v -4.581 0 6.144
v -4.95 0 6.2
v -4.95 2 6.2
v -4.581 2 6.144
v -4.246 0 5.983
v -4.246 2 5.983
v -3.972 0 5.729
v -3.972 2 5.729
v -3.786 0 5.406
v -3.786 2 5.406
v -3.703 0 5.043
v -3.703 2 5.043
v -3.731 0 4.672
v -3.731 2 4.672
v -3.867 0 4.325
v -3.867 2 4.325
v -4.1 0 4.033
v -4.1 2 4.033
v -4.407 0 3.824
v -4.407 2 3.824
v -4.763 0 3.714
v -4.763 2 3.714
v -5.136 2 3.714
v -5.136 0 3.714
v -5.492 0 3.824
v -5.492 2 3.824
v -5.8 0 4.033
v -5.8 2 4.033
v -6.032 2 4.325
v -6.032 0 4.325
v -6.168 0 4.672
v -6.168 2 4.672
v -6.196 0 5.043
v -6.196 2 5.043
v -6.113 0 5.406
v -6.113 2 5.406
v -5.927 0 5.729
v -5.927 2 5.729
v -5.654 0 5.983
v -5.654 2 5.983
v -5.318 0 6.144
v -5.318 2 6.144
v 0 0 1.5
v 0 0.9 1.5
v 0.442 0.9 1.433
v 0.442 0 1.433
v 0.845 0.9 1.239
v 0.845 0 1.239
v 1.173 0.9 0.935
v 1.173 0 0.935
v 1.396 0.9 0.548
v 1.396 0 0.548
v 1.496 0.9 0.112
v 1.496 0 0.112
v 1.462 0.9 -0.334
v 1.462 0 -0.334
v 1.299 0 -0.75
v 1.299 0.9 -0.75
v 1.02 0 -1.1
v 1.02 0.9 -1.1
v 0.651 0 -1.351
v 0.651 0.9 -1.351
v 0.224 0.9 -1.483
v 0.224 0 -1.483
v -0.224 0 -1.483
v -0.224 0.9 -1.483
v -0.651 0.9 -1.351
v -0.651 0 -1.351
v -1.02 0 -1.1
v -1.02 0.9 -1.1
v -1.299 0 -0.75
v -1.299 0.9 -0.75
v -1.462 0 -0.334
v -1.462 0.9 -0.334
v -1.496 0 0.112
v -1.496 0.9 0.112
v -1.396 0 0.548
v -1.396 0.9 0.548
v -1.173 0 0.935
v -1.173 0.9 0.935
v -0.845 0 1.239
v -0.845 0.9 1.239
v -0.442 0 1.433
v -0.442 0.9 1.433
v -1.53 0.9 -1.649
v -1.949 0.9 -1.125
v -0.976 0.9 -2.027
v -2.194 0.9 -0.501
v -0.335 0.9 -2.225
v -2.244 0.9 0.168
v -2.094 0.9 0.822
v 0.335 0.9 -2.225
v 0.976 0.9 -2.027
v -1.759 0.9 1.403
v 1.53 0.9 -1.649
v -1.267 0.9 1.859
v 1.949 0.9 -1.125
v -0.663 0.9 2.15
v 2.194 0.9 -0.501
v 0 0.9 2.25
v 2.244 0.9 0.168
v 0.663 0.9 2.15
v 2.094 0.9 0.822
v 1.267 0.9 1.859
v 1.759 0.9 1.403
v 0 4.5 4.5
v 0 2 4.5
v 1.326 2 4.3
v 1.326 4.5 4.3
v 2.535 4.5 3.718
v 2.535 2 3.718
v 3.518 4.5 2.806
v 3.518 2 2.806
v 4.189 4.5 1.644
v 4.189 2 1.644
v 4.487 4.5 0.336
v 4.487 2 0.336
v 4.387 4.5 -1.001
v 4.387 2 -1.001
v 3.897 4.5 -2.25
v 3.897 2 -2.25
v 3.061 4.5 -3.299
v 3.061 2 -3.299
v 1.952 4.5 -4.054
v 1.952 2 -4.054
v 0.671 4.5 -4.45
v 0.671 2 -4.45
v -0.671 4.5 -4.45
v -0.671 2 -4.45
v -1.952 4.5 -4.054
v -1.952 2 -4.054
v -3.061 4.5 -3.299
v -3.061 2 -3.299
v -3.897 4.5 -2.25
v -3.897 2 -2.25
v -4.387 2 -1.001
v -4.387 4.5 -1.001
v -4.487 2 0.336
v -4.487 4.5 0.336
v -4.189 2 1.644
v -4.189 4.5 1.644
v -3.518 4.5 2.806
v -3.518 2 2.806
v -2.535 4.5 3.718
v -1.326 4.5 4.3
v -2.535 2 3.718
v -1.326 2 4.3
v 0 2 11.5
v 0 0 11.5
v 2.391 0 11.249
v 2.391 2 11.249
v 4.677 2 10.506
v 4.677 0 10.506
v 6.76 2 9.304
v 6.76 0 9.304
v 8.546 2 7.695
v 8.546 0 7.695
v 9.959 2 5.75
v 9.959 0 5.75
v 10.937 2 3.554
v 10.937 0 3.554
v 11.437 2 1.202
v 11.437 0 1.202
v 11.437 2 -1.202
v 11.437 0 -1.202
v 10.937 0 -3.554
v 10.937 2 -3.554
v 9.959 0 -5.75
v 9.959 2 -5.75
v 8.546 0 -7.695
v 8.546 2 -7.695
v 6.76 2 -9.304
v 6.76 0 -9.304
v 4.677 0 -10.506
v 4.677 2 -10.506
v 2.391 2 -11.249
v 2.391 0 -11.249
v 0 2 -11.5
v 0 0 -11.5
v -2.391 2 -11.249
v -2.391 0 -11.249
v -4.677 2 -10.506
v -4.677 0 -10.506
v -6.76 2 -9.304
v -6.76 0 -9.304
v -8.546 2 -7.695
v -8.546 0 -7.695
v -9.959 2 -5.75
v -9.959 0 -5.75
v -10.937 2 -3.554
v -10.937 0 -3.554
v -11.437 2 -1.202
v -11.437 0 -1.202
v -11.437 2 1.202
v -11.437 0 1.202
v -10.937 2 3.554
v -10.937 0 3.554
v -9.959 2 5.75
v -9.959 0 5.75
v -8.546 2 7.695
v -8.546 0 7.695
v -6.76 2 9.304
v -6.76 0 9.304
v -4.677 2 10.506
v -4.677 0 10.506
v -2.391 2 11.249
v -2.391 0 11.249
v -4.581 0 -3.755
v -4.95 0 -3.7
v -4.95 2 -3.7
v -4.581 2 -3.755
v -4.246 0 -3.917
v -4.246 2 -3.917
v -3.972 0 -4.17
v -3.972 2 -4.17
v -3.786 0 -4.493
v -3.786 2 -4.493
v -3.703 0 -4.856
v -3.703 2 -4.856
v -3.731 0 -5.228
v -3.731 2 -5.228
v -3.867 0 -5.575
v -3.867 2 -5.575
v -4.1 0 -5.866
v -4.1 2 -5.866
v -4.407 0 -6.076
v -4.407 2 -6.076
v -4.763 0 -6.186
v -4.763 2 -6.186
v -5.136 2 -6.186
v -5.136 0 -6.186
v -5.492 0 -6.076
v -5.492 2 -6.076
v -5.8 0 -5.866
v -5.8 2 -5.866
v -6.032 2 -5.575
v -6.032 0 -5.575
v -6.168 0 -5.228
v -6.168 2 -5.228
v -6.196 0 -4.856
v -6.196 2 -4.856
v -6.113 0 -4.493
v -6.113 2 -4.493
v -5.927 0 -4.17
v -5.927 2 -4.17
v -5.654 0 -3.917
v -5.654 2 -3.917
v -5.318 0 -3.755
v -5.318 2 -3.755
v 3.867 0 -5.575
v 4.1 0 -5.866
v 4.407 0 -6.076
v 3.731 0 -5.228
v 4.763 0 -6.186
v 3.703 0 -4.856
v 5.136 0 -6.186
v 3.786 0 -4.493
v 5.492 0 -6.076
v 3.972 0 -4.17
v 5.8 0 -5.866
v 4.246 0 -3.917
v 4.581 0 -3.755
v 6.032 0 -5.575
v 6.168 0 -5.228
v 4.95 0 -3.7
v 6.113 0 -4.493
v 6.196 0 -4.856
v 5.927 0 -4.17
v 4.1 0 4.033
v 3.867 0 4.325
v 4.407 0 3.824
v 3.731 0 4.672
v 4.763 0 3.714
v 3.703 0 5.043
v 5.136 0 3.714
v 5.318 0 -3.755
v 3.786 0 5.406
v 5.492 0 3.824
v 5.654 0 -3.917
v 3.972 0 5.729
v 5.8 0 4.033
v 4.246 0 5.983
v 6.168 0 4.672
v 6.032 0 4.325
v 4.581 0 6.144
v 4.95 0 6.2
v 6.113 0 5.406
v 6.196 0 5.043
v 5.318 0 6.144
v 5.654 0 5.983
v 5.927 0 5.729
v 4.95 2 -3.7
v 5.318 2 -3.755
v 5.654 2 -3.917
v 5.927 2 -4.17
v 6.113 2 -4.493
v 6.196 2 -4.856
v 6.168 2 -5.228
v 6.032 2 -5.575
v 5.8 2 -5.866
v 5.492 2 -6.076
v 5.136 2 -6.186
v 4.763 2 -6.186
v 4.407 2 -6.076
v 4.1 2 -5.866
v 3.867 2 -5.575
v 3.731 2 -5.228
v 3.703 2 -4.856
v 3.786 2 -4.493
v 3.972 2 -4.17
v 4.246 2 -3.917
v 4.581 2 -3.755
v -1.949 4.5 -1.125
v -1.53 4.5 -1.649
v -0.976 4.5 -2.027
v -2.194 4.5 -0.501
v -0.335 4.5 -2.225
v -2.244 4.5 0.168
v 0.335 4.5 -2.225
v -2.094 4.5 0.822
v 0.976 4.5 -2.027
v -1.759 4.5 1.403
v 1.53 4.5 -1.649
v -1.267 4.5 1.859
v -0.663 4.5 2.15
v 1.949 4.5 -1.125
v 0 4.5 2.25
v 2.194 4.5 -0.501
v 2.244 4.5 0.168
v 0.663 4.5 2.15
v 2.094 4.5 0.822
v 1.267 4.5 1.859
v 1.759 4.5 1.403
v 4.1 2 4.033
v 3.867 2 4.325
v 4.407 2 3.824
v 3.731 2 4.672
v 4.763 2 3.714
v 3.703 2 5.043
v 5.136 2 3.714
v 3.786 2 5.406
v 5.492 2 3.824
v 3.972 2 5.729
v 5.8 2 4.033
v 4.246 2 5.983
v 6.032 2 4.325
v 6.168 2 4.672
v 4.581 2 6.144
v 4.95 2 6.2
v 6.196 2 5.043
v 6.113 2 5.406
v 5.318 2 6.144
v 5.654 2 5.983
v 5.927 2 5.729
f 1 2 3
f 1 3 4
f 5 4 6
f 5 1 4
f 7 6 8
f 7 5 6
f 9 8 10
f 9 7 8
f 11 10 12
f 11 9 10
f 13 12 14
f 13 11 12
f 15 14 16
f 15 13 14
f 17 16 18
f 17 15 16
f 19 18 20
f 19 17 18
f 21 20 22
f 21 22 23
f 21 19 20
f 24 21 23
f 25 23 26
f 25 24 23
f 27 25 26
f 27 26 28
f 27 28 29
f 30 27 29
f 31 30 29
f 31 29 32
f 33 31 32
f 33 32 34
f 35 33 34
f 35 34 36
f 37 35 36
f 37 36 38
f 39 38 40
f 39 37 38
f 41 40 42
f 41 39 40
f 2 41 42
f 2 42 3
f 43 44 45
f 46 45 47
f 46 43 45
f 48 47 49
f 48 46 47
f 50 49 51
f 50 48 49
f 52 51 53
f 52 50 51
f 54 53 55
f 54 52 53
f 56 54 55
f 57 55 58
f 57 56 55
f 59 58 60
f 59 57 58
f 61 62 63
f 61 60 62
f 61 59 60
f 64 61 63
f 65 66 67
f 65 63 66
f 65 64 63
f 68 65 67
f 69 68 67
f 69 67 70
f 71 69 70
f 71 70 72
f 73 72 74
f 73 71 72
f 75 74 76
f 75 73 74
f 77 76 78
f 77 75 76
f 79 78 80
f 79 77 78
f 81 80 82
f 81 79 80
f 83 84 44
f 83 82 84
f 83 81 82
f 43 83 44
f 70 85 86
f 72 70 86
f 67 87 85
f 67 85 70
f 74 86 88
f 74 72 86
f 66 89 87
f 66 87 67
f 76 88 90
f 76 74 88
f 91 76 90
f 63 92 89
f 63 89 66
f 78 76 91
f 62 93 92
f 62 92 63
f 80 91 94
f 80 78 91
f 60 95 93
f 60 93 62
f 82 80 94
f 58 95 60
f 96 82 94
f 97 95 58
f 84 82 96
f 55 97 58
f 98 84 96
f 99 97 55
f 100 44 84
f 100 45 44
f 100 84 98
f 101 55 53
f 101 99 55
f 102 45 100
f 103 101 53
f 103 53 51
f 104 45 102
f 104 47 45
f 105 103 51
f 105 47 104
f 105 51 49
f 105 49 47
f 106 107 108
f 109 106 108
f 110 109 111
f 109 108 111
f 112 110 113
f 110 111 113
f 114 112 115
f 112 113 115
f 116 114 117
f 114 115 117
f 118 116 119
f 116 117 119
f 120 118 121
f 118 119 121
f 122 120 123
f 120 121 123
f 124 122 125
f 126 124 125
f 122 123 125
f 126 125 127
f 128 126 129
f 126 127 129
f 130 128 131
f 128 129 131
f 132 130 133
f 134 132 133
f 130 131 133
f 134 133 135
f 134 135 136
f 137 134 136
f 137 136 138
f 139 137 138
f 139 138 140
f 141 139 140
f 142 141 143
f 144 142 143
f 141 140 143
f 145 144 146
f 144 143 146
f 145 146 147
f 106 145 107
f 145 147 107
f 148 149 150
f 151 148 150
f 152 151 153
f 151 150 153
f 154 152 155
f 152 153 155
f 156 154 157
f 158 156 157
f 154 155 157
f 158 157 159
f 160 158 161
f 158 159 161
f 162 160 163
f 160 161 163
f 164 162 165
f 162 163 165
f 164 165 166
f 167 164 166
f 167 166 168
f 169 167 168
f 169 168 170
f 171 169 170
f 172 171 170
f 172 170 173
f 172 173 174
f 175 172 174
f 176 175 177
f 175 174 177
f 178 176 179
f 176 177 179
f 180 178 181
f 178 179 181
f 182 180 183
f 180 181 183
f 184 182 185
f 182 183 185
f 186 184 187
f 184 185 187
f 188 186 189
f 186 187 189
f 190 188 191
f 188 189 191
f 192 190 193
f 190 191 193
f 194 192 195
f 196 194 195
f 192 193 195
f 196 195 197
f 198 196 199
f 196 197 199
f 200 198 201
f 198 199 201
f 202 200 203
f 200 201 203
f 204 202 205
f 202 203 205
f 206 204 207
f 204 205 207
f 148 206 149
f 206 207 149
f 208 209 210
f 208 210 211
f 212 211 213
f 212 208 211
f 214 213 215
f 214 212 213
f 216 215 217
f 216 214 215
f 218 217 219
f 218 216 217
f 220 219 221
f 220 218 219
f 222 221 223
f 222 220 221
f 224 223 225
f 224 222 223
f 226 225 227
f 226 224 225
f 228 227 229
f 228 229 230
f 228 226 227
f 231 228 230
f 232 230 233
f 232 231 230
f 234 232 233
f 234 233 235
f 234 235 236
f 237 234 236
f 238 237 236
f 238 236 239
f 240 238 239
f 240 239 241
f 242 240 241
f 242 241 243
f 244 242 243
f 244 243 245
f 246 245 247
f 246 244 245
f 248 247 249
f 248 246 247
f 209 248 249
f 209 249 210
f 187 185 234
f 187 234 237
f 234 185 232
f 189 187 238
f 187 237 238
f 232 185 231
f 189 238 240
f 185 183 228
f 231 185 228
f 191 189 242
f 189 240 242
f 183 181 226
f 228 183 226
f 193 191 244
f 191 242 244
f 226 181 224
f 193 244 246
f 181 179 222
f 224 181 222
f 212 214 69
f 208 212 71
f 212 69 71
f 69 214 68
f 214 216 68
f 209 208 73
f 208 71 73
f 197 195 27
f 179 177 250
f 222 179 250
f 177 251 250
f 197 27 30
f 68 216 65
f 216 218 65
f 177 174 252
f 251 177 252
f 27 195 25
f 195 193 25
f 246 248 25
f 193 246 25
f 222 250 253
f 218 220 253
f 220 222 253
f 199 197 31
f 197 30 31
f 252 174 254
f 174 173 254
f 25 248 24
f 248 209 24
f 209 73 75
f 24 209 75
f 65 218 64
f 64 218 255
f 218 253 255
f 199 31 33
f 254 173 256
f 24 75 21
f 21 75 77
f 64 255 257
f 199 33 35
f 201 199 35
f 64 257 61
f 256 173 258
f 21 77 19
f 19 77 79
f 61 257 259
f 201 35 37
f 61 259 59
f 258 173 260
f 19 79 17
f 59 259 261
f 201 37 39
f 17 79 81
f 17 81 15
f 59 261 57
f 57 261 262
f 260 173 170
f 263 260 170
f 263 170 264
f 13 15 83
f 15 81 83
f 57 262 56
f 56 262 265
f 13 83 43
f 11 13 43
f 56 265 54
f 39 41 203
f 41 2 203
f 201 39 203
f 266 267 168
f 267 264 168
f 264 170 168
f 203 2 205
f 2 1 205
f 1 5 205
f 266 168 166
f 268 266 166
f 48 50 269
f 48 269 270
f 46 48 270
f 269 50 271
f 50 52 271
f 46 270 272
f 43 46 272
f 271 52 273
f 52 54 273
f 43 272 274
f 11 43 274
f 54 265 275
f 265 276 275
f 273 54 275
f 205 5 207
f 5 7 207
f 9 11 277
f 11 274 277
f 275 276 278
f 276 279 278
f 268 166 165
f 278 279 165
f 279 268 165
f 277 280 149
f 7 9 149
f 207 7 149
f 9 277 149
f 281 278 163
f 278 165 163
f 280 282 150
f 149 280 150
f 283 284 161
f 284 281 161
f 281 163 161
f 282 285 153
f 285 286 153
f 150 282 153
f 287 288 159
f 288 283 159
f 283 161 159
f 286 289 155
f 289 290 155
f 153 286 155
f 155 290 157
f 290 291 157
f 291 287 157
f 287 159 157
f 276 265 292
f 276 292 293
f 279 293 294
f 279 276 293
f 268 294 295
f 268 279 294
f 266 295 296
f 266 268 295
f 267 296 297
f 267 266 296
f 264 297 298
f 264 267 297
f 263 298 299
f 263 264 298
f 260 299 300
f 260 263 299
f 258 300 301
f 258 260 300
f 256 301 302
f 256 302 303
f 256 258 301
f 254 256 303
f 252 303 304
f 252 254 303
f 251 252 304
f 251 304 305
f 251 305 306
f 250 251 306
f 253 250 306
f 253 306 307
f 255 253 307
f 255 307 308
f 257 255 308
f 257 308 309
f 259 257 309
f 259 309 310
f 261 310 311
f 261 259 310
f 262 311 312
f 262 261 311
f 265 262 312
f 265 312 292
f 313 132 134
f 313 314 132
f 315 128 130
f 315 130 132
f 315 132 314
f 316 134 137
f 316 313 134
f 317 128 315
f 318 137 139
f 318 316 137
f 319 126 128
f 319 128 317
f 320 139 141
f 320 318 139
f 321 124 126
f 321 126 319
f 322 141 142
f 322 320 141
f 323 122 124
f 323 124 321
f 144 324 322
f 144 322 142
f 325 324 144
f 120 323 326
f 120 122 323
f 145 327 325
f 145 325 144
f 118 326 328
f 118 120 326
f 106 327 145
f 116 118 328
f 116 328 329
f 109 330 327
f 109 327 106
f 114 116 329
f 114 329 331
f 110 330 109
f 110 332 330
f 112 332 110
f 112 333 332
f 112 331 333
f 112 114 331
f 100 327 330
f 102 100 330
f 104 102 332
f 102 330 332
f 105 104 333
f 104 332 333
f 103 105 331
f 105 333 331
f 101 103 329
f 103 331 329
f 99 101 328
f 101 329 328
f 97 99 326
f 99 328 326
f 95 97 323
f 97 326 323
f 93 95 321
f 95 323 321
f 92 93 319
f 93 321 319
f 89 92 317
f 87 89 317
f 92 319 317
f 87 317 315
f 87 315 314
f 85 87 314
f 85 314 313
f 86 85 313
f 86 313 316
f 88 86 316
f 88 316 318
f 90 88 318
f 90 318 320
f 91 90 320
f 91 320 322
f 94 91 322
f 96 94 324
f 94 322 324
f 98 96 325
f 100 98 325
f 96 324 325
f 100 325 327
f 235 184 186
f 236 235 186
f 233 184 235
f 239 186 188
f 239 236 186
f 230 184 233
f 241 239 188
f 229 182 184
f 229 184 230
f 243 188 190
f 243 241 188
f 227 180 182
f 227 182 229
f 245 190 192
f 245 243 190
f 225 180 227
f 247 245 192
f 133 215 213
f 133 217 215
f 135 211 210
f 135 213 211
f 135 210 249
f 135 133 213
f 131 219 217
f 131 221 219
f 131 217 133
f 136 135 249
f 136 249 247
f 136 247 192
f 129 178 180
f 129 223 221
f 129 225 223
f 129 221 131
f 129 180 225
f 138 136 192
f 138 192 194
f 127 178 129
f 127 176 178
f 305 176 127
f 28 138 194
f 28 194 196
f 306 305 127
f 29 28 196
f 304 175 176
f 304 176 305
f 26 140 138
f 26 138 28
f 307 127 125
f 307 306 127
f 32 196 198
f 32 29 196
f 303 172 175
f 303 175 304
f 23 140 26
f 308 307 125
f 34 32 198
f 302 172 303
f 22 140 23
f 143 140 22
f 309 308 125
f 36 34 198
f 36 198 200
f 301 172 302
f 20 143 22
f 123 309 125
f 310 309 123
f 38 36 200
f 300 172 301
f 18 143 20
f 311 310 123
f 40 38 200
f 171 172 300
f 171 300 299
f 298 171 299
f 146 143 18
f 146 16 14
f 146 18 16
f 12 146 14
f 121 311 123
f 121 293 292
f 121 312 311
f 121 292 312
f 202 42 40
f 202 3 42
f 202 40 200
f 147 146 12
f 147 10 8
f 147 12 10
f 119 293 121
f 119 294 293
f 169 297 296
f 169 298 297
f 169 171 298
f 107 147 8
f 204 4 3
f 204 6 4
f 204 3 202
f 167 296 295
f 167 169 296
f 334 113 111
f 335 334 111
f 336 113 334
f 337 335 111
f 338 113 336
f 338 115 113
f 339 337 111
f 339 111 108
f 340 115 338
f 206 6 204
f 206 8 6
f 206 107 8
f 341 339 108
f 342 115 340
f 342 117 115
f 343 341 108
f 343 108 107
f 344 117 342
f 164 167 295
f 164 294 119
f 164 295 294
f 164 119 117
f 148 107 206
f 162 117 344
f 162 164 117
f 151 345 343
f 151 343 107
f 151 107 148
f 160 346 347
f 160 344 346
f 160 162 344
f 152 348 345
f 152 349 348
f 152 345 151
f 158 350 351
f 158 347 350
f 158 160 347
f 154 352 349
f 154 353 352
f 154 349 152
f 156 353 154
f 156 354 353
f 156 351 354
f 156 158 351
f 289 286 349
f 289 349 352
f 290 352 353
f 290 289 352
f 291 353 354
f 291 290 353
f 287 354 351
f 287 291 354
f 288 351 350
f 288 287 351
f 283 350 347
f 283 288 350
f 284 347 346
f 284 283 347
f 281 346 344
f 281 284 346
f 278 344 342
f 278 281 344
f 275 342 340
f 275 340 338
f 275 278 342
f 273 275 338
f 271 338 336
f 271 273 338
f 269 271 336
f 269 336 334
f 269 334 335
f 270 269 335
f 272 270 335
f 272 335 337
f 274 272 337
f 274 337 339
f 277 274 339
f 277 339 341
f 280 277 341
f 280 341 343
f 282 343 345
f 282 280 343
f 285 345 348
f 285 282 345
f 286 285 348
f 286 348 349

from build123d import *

# Parameters (mm, degrees)
SKETCH1_R           = 11.5
SKETCH1_R_2         = 1.25
SKETCH1_R_3         = 1.5
BOSS_EXTRUDE1_DEPTH = 2
SKETCH2_R           = 4.5
SKETCH2_R_2         = 1.5
BOSS_EXTRUDE2_DEPTH = 2.5
SKETCH3_R           = 2.25
CUT_EXTRUDE1_DEPTH  = 3.6


with BuildPart() as part:
    # Sketch1 → Boss-Extrude1 (new body)
    with BuildSketch(Plane(origin=(0, 0, 0), x_dir=(1, 0, 0), z_dir=(0, 1, 0))):
        with Locations(Location((0, 0, 0), (0, 0, 270))):
            Circle(SKETCH1_R)
        with Locations(Location((-4.949747468, 4.949747468, 0), (0, 0, 270))):
            Circle(SKETCH1_R_2, mode=Mode.SUBTRACT)
        with Locations(Location((4.949747468, 4.949747468, 0), (0, 0, 270))):
            Circle(SKETCH1_R_2, mode=Mode.SUBTRACT)
        with Locations(Location((4.949747468, -4.949747468, 0), (0, 0, 270))):
            Circle(SKETCH1_R_2, mode=Mode.SUBTRACT)
        with Locations(Location((-4.949747468, -4.949747468, 0), (0, 0, 270))):
            Circle(SKETCH1_R_2, mode=Mode.SUBTRACT)
        with Locations(Location((0, 0, 0), (0, 0, 270))):
            Circle(SKETCH1_R_3, mode=Mode.SUBTRACT)
    extrude(amount=BOSS_EXTRUDE1_DEPTH)

    # Sketch2 → Boss-Extrude2 (add)
    with BuildSketch(Plane(origin=(0, 2, 0), x_dir=(1, 0, 0), z_dir=(0, 1, 0))):
        with Locations(Location((0, 0, 0), (0, 0, 270))):
            Circle(SKETCH2_R)
        with Locations(Location((0, 0, 0), (0, 0, 270))):
            Circle(SKETCH2_R_2, mode=Mode.SUBTRACT)
    extrude(amount=BOSS_EXTRUDE2_DEPTH)

    # Sketch3 → Cut-Extrude1 (cut)
    with BuildSketch(Plane(origin=(0, 4.5, 0), x_dir=(1, 0, 0), z_dir=(0, 1, 0))):
        with Locations(Location((0, 0, 0), (0, 0, 270))):
            Circle(SKETCH3_R)
    extrude(amount=-CUT_EXTRUDE1_DEPTH, mode=Mode.SUBTRACT)


solid = part.part
